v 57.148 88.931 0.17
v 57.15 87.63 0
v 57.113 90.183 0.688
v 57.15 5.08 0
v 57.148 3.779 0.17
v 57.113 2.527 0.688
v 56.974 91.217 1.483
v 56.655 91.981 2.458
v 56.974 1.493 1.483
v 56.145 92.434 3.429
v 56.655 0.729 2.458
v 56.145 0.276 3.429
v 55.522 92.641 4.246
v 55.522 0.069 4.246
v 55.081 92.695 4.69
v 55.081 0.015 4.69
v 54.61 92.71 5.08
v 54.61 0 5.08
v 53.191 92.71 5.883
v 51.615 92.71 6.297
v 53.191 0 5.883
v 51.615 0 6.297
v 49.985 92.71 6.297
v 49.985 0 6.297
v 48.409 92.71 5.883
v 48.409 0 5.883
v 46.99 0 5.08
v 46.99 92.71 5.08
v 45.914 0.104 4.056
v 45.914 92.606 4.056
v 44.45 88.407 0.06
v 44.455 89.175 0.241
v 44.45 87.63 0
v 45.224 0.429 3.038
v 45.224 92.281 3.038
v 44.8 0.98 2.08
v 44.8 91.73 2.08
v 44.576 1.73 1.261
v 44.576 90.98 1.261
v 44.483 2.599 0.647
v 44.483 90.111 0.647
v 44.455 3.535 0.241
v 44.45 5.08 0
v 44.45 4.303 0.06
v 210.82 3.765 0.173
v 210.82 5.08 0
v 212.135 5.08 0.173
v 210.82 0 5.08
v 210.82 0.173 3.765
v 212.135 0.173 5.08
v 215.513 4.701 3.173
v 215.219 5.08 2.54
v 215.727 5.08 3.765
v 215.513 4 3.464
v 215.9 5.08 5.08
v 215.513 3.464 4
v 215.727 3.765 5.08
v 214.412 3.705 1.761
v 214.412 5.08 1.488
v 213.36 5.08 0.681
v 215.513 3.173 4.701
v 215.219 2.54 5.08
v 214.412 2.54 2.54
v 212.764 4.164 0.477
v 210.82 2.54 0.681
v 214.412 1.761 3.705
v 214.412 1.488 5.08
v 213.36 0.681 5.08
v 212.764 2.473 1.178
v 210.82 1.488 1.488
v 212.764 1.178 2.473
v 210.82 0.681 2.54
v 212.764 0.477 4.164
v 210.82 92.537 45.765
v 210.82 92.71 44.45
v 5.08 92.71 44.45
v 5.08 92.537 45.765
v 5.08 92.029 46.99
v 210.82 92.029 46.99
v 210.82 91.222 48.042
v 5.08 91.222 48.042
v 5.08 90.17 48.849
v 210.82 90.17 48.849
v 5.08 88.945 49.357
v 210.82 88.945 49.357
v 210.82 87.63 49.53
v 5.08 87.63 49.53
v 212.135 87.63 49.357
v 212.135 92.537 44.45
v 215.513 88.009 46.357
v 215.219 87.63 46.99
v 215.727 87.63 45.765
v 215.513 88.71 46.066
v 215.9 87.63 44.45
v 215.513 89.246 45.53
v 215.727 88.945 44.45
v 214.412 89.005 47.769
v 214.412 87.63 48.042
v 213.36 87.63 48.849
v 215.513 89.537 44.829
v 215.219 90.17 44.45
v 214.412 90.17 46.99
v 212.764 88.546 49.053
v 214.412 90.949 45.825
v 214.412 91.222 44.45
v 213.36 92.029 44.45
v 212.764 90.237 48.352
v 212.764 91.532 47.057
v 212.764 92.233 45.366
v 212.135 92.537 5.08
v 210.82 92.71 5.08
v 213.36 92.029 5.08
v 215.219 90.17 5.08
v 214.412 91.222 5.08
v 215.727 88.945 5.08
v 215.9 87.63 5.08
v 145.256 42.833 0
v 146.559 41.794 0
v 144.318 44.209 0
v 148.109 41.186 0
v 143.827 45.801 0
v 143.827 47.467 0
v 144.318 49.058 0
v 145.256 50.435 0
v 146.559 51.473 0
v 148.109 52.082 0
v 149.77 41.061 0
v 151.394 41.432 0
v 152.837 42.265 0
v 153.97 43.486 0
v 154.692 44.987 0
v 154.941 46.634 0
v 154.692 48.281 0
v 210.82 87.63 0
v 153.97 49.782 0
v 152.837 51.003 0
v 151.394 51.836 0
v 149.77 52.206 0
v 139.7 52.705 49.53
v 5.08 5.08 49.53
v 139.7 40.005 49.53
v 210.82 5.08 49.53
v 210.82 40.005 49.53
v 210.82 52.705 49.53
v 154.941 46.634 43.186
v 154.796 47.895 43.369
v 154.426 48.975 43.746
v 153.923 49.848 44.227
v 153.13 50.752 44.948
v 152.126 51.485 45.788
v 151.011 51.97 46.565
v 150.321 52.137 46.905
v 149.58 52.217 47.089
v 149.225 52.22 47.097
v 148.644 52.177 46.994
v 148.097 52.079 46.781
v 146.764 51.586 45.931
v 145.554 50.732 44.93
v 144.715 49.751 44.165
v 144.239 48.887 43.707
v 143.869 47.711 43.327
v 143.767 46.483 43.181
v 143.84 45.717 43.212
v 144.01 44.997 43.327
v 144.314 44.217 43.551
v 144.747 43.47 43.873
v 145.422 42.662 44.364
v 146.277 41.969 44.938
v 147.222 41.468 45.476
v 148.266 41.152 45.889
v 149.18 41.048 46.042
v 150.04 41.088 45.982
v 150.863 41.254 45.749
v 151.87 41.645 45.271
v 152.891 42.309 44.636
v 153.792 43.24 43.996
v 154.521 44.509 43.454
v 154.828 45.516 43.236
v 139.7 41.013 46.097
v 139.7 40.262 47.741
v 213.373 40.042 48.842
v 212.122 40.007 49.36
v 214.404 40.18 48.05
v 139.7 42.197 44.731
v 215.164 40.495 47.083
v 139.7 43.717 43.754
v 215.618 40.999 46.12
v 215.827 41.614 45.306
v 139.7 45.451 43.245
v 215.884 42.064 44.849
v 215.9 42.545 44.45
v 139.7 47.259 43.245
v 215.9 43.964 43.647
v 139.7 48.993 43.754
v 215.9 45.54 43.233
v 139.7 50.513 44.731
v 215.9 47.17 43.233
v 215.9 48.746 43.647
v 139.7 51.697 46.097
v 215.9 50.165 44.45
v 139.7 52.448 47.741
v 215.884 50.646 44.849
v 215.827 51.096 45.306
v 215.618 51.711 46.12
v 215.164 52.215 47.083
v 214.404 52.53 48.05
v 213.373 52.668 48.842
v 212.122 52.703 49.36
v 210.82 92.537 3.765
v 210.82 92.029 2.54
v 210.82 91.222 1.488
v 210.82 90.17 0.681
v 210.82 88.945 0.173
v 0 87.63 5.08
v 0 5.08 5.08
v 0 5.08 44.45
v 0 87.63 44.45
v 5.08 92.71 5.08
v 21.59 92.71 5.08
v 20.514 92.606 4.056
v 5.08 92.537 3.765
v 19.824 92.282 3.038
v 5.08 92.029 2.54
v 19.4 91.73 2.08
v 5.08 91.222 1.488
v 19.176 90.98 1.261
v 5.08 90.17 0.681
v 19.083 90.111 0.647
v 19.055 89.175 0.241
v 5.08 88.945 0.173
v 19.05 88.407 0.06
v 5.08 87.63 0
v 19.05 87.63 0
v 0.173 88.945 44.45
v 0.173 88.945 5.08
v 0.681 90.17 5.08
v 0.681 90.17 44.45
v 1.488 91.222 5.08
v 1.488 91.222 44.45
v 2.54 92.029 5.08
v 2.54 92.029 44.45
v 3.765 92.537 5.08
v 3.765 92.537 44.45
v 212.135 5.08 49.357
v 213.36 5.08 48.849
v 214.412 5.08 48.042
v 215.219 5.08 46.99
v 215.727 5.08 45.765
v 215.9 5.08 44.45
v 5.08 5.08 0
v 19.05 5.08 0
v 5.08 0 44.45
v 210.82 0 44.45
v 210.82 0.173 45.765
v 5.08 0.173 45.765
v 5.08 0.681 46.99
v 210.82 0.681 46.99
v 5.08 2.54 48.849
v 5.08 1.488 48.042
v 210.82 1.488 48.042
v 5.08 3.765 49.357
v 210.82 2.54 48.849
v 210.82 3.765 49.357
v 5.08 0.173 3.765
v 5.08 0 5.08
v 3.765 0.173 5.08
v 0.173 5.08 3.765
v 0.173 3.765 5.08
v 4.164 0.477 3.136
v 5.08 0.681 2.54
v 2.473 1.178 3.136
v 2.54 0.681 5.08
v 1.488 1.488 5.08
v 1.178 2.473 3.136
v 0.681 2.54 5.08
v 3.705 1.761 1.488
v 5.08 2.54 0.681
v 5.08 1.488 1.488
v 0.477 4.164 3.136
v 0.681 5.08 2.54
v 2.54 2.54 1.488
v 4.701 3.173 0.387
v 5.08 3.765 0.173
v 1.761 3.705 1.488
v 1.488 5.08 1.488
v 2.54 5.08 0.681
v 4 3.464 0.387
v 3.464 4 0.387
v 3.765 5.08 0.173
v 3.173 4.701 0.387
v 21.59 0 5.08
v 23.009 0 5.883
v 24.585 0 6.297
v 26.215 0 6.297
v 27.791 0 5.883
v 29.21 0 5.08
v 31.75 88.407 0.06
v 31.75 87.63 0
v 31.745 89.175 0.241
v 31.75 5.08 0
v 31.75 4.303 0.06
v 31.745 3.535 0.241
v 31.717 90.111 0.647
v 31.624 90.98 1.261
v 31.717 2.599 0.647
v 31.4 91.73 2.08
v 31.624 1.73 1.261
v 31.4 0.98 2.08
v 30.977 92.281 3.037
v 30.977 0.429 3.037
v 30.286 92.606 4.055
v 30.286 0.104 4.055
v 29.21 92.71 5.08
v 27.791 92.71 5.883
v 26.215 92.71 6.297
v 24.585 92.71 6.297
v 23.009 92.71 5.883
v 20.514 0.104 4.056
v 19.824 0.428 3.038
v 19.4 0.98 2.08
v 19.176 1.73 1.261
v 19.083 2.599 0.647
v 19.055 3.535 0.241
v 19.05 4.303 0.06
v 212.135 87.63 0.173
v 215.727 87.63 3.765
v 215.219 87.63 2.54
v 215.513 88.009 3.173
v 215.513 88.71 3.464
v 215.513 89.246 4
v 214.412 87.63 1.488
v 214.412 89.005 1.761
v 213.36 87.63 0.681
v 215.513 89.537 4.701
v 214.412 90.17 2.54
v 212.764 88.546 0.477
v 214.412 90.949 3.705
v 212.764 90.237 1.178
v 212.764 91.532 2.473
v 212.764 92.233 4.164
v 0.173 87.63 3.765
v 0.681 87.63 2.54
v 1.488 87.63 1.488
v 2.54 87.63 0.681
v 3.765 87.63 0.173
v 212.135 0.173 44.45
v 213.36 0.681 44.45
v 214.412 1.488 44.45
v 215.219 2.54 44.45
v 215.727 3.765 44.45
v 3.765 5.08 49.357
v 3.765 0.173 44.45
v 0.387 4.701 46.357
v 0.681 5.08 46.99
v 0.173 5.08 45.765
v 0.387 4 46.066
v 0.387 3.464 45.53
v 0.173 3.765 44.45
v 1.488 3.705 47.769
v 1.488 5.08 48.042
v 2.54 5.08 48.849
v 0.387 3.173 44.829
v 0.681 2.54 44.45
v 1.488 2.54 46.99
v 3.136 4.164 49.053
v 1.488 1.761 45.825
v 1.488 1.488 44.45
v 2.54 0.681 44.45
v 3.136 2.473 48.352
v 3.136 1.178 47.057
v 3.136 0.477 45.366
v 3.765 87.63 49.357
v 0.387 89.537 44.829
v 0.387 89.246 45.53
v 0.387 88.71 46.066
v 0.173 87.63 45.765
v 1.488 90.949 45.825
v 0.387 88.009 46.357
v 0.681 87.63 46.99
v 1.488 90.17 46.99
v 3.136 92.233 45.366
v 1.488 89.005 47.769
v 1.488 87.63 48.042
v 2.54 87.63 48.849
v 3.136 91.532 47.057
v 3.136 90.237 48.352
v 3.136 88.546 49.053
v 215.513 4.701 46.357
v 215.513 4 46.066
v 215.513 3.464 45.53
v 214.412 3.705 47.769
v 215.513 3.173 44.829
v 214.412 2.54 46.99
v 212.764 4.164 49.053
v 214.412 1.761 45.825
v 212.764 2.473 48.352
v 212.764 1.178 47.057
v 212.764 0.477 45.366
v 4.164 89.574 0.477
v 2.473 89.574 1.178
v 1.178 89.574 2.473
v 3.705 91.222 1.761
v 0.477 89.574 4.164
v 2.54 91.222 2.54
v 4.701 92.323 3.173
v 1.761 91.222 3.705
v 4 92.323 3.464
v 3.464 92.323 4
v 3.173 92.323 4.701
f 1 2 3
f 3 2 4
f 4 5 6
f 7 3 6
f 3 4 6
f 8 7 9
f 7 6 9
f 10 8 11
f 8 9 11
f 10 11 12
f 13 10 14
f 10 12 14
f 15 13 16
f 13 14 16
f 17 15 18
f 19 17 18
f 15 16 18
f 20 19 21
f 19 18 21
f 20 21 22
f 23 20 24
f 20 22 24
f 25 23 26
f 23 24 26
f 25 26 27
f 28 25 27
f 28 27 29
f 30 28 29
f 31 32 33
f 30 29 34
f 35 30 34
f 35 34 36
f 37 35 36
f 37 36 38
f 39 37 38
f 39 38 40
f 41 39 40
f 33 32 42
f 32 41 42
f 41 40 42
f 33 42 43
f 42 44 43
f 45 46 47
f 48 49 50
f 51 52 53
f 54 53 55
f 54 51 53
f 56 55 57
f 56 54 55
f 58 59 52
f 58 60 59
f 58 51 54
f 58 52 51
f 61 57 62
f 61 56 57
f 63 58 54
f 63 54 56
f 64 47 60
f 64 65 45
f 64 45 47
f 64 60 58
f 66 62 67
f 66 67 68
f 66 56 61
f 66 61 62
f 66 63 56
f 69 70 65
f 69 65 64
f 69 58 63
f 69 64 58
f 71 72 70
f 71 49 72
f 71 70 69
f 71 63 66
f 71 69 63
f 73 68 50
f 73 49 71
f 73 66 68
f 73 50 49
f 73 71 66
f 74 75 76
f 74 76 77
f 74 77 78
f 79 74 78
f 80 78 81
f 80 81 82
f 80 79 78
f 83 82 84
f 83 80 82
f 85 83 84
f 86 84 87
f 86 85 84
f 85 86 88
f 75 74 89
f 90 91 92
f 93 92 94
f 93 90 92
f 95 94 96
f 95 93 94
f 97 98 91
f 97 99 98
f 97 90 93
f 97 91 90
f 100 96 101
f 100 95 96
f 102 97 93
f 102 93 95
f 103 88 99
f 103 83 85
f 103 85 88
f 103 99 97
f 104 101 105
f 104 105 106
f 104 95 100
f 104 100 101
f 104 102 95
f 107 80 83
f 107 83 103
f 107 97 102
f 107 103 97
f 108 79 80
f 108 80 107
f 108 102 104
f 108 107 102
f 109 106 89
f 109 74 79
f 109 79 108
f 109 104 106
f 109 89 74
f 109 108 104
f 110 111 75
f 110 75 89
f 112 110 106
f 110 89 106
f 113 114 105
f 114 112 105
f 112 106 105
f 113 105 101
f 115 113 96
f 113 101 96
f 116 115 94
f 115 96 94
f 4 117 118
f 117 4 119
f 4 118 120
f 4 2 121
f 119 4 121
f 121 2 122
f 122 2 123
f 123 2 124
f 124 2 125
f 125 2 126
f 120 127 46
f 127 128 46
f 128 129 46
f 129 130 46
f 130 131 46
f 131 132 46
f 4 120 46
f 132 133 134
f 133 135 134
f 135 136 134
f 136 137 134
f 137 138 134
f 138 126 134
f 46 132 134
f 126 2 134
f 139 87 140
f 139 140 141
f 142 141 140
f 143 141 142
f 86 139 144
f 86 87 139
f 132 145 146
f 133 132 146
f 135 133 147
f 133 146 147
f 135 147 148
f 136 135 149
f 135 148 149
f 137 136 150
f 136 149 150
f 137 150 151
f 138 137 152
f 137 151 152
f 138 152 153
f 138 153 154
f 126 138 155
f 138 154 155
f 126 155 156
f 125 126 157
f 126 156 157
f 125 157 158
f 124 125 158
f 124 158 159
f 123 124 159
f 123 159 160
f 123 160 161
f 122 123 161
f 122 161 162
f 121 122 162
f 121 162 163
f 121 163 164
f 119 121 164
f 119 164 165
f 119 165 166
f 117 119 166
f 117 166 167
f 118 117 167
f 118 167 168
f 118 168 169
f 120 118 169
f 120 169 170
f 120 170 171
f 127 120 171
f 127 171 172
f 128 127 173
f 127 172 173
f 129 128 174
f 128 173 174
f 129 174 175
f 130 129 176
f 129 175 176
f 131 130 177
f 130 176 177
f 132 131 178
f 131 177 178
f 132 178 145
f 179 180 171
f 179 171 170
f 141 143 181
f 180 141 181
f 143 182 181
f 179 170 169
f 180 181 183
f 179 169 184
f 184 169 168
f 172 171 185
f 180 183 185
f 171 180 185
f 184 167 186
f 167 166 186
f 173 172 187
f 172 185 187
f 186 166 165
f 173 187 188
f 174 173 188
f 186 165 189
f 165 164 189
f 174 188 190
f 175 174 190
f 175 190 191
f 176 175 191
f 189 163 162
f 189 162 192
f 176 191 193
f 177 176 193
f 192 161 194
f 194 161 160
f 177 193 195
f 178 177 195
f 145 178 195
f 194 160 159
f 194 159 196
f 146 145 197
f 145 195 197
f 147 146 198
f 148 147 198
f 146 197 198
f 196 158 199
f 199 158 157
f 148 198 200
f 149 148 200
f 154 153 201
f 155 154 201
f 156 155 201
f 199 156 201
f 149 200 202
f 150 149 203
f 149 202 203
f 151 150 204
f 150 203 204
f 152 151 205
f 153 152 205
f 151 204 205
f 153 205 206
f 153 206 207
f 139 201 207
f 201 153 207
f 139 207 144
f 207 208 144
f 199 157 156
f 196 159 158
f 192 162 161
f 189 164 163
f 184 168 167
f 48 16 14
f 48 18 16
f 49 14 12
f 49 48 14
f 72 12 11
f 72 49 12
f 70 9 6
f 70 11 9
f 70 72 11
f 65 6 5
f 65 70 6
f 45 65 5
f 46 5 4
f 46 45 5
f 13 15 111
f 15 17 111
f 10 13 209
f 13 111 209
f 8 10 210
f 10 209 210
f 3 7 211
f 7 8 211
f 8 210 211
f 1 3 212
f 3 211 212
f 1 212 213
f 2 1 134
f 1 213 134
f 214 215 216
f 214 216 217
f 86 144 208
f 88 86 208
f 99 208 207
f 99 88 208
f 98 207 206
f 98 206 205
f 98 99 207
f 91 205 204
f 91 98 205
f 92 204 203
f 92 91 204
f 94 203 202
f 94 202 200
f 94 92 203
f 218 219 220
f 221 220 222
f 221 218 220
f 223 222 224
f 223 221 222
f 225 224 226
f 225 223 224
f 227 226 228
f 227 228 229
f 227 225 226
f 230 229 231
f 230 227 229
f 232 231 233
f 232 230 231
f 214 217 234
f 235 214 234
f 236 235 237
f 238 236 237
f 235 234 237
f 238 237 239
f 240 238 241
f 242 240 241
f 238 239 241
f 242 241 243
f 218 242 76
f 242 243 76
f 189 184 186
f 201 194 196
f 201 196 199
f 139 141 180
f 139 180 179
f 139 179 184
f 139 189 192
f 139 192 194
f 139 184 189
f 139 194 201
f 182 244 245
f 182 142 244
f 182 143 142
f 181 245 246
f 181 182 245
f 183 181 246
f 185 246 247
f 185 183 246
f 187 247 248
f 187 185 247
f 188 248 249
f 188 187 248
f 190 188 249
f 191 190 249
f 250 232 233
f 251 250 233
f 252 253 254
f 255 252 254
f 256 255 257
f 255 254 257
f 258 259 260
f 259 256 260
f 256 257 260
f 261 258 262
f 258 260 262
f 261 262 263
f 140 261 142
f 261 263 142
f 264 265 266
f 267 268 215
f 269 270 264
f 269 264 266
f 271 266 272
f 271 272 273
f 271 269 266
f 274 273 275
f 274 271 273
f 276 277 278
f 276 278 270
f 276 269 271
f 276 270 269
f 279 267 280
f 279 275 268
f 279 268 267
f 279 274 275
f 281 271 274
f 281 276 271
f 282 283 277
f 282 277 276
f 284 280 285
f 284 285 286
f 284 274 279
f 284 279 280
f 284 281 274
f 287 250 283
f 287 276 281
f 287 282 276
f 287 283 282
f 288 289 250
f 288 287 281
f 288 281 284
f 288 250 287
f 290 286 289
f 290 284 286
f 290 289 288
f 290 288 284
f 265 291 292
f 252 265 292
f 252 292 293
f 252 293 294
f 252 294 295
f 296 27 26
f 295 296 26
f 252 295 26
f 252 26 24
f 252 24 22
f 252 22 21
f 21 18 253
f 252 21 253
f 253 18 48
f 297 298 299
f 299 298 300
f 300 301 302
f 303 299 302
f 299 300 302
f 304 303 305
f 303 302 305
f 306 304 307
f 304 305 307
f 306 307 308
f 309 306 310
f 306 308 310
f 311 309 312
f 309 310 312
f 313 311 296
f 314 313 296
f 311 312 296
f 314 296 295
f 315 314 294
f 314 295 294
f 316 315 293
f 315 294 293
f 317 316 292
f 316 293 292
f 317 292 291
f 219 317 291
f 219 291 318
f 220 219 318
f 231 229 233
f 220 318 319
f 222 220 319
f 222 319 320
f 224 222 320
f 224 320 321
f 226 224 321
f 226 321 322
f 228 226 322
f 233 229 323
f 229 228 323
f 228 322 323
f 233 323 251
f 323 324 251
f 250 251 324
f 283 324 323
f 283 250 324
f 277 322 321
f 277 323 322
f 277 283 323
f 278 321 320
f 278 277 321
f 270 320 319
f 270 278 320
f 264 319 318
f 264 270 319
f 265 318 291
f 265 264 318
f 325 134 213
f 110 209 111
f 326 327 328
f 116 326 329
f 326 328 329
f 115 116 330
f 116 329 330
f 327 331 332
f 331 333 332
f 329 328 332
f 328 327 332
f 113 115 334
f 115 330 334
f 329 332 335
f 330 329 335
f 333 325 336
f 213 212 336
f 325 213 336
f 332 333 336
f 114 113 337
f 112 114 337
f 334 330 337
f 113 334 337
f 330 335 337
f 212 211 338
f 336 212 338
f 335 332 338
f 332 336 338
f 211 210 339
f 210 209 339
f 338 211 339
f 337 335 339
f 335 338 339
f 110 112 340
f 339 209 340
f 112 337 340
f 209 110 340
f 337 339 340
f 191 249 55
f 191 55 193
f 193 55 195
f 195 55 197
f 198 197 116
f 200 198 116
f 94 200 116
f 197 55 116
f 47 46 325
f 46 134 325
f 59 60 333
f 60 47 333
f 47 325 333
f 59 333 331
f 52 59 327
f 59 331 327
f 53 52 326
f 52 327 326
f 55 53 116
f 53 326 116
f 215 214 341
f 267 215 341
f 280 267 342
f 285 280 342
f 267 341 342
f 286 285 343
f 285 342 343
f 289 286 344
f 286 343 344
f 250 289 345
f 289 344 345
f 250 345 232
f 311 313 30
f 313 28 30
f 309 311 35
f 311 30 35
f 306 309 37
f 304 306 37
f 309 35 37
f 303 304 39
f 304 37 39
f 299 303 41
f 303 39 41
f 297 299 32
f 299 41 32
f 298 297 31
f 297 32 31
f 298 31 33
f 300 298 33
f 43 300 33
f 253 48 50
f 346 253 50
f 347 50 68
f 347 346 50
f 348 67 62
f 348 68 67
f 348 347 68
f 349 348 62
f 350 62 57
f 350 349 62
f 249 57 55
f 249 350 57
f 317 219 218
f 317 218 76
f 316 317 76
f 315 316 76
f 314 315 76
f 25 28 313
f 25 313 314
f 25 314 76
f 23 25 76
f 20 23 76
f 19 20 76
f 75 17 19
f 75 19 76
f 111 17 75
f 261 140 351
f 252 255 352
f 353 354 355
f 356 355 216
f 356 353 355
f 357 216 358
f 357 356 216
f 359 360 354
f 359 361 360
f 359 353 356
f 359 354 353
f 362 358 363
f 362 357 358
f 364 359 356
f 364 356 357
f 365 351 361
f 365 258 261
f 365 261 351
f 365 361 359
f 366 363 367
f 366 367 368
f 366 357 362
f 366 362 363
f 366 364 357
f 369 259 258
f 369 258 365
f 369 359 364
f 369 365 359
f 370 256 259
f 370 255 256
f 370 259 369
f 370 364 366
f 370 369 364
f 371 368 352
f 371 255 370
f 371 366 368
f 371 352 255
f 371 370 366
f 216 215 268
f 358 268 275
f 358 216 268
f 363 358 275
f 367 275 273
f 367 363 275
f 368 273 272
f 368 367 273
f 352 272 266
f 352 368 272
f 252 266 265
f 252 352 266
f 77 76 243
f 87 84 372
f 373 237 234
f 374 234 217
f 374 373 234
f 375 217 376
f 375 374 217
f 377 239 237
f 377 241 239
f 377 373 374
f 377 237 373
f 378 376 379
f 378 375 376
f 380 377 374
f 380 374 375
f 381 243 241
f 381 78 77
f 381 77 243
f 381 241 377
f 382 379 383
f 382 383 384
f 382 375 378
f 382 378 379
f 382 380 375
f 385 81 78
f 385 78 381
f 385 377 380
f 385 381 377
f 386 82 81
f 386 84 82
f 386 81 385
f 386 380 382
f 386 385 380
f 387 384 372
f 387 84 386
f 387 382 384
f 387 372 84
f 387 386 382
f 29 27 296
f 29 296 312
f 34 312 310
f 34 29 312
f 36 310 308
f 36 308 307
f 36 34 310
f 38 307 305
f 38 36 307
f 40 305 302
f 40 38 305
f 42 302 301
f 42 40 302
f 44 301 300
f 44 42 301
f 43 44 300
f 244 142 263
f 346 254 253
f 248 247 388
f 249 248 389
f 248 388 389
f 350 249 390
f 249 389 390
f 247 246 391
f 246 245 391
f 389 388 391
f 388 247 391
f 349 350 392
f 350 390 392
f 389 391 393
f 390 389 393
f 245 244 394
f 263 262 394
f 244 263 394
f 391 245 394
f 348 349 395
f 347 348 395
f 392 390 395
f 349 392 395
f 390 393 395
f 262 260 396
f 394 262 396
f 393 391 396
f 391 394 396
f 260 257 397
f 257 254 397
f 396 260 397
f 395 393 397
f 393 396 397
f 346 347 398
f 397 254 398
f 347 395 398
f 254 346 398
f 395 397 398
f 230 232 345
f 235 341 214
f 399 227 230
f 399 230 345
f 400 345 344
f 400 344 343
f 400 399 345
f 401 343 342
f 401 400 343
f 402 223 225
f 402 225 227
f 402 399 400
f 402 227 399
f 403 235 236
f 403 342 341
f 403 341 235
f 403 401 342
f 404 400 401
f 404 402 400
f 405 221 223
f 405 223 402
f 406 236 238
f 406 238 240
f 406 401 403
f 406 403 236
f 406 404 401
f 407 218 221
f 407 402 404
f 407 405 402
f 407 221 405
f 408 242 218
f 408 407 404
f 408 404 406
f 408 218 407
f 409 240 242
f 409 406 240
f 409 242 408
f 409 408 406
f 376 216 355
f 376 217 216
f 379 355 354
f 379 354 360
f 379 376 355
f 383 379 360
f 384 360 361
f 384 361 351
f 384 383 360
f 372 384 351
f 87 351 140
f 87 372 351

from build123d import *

# Parameters (mm, degrees)
F0_W         = 215.9
F0_H         = 92.71
F1_DEPTH     = 49.53
F3_DEPTH     = 76.2
F5_DEPTH     = 92.71
F6_R         = 5.08
F7_R         = 6.35
F8_DEPTH     = 92.7110001
F9_T1_DEPTH  = 26.67
F9_S5_W      = 5.08
F9_S5_H      = 5.08
F9_T6_DEPTH  = 5.08
F9_S11_W     = 5.08
F9_S11_H     = 5.08
F9_T12_DEPTH = 5.08
F10_R        = 5.588
F11_DEPTH    = 49.5310001


# Not quite as in the source:
# - a fillet or chamfer that OpenCascade refuses, or shapes differently, is made with other operations: its cross-section is extruded or revolved along the edge and cut away or added


with BuildPart() as f1:
    # F0 (on Top) → F1 (new body)
    with BuildSketch(Plane.XY):
        with Locations((107.95, 46.355)):
            Rectangle(F0_W, F0_H)
    extrude(amount=F1_DEPTH)

    # F2 (on face) → F3 (cut)
    with BuildSketch(Plane.YZ.offset(215.9)):
        with BuildLine():
            Line((52.705, 49.53), (40.005, 49.53))
            ThreePointArc((40.005, 49.53), (46.355, 43.18), (52.705, 49.53))
        make_face()
    extrude(amount=-F3_DEPTH, mode=Mode.SUBTRACT)

    # F4 (on face) → F5 (cut, through all)
    with BuildSketch(Plane.XZ):
        with BuildLine():
            Line((19.05, 0), (31.75, 0))
            ThreePointArc((31.75, 0), (25.4, 6.35), (19.05, 0))
        make_face()
    extrude(amount=-F5_DEPTH, mode=Mode.SUBTRACT)

    # F6
    f6_edges = [f1.edges().sort_by_distance(p)[0] for p in [
        (107.95, 0, 49.53),
        (215.9, 20.0025, 49.53),
        (107.95, 92.71, 49.53),
        (215.9, 72.7075, 49.53),
        (0, 92.71, 24.765),
        (0, 46.355, 49.53),
        (0, 0, 24.765),
        (0, 46.355, 0),
        (123.825, 0, 0),
        (123.825, 92.71, 0),
        (215.9, 46.355, 0),
        (215.9, 92.71, 24.765),
        (215.9, 0, 24.765),
    ]]
    fillet(f6_edges, radius=F6_R)

    # F7 (on Front) → F8 (cut, through all)
    with BuildSketch(Plane.XZ):
        with Locations((50.8, 0)):
            Circle(F7_R)
    extrude(amount=-F8_DEPTH, mode=Mode.SUBTRACT)

    # F9: fillet of radius 5.08 on 2 edges, made by hand

    # F9_s2 → F9_t1 (cut)
    with BuildSketch(Plane.YZ.offset(5.08)):
        with BuildLine():
            ThreePointArc((5.08, 0), (1.4878975516, 1.4878975516), (0, 5.08))
            Line((0, 5.08), (0, 0))
            Line((0, 0), (5.08, 0))
        make_face()
        with BuildLine():
            ThreePointArc((92.71, 5.08), (91.2221024484, 1.4878975516), (87.63, 0))
            Line((87.63, 0), (92.71, 0))
            Line((92.71, 0), (92.71, 5.08))
        make_face()
    extrude(amount=F9_T1_DEPTH, mode=Mode.SUBTRACT)


with BuildPart() as f9_tool4:
    # F9_s5 → F9_t6 (new body)
    with BuildSketch(Plane.XZ.offset(-87.63)):
        with Locations((2.54, 2.54)):
            Rectangle(F9_S5_W, F9_S5_H)
    extrude(amount=-F9_T6_DEPTH)

    # F9_s7 → F9_t8 (revolve, cut)
    with BuildSketch(Plane(origin=(5.08, 87.63, 5.08), x_dir=(0.7071067812, 0, 0.7071067812), z_dir=(-0.7071067812, 0, 0.7071067812))):
        with BuildLine():
            ThreePointArc((0, -5.08), (5.08, 0), (0, 5.08))
            Line((0, 5.08), (0, -5.08))
        make_face()
    revolve(axis=Axis((5.08, 87.63, 5.08), (0, 1, 0)), mode=Mode.SUBTRACT)


with BuildPart() as f1_1:
    add(f1.part)

    # F9_t3: cut F9_tool4
    add(f9_tool4.part, mode=Mode.SUBTRACT)


with BuildPart() as f9_tool10:
    # F9_s11 → F9_t12 (new body)
    with BuildSketch(Plane.XY.offset(5.08)):
        with Locations((2.54, 2.54)):
            Rectangle(F9_S11_W, F9_S11_H)
    extrude(amount=-F9_T12_DEPTH)

    # F9_s13 → F9_t14 (revolve, cut)
    with BuildSketch(Plane(origin=(5.08, 5.08, 5.08), x_dir=(0.7071067812, 0.7071067812, 0), z_dir=(-0.7071067812, 0.7071067812, 0))):
        with BuildLine():
            ThreePointArc((0, -5.08), (5.08, 0), (0, 5.08))
            Line((0, 5.08), (0, -5.08))
        make_face()
    revolve(axis=Axis((5.08, 5.08, 5.08), (0, 0, -1)), mode=Mode.SUBTRACT)


with BuildPart() as f1_2:
    add(f1_1.part)

    # F9_t9: cut F9_tool10
    add(f9_tool10.part, mode=Mode.SUBTRACT)

    # F10 (on face) → F11 (cut, through all)
    with BuildSketch(Plane.XY.offset(49.53)):
        with Locations((149.3525841786, 46.6338395569)):
            Circle(F10_R)
    extrude(amount=-F11_DEPTH, mode=Mode.SUBTRACT)


solid = f1_2.part
